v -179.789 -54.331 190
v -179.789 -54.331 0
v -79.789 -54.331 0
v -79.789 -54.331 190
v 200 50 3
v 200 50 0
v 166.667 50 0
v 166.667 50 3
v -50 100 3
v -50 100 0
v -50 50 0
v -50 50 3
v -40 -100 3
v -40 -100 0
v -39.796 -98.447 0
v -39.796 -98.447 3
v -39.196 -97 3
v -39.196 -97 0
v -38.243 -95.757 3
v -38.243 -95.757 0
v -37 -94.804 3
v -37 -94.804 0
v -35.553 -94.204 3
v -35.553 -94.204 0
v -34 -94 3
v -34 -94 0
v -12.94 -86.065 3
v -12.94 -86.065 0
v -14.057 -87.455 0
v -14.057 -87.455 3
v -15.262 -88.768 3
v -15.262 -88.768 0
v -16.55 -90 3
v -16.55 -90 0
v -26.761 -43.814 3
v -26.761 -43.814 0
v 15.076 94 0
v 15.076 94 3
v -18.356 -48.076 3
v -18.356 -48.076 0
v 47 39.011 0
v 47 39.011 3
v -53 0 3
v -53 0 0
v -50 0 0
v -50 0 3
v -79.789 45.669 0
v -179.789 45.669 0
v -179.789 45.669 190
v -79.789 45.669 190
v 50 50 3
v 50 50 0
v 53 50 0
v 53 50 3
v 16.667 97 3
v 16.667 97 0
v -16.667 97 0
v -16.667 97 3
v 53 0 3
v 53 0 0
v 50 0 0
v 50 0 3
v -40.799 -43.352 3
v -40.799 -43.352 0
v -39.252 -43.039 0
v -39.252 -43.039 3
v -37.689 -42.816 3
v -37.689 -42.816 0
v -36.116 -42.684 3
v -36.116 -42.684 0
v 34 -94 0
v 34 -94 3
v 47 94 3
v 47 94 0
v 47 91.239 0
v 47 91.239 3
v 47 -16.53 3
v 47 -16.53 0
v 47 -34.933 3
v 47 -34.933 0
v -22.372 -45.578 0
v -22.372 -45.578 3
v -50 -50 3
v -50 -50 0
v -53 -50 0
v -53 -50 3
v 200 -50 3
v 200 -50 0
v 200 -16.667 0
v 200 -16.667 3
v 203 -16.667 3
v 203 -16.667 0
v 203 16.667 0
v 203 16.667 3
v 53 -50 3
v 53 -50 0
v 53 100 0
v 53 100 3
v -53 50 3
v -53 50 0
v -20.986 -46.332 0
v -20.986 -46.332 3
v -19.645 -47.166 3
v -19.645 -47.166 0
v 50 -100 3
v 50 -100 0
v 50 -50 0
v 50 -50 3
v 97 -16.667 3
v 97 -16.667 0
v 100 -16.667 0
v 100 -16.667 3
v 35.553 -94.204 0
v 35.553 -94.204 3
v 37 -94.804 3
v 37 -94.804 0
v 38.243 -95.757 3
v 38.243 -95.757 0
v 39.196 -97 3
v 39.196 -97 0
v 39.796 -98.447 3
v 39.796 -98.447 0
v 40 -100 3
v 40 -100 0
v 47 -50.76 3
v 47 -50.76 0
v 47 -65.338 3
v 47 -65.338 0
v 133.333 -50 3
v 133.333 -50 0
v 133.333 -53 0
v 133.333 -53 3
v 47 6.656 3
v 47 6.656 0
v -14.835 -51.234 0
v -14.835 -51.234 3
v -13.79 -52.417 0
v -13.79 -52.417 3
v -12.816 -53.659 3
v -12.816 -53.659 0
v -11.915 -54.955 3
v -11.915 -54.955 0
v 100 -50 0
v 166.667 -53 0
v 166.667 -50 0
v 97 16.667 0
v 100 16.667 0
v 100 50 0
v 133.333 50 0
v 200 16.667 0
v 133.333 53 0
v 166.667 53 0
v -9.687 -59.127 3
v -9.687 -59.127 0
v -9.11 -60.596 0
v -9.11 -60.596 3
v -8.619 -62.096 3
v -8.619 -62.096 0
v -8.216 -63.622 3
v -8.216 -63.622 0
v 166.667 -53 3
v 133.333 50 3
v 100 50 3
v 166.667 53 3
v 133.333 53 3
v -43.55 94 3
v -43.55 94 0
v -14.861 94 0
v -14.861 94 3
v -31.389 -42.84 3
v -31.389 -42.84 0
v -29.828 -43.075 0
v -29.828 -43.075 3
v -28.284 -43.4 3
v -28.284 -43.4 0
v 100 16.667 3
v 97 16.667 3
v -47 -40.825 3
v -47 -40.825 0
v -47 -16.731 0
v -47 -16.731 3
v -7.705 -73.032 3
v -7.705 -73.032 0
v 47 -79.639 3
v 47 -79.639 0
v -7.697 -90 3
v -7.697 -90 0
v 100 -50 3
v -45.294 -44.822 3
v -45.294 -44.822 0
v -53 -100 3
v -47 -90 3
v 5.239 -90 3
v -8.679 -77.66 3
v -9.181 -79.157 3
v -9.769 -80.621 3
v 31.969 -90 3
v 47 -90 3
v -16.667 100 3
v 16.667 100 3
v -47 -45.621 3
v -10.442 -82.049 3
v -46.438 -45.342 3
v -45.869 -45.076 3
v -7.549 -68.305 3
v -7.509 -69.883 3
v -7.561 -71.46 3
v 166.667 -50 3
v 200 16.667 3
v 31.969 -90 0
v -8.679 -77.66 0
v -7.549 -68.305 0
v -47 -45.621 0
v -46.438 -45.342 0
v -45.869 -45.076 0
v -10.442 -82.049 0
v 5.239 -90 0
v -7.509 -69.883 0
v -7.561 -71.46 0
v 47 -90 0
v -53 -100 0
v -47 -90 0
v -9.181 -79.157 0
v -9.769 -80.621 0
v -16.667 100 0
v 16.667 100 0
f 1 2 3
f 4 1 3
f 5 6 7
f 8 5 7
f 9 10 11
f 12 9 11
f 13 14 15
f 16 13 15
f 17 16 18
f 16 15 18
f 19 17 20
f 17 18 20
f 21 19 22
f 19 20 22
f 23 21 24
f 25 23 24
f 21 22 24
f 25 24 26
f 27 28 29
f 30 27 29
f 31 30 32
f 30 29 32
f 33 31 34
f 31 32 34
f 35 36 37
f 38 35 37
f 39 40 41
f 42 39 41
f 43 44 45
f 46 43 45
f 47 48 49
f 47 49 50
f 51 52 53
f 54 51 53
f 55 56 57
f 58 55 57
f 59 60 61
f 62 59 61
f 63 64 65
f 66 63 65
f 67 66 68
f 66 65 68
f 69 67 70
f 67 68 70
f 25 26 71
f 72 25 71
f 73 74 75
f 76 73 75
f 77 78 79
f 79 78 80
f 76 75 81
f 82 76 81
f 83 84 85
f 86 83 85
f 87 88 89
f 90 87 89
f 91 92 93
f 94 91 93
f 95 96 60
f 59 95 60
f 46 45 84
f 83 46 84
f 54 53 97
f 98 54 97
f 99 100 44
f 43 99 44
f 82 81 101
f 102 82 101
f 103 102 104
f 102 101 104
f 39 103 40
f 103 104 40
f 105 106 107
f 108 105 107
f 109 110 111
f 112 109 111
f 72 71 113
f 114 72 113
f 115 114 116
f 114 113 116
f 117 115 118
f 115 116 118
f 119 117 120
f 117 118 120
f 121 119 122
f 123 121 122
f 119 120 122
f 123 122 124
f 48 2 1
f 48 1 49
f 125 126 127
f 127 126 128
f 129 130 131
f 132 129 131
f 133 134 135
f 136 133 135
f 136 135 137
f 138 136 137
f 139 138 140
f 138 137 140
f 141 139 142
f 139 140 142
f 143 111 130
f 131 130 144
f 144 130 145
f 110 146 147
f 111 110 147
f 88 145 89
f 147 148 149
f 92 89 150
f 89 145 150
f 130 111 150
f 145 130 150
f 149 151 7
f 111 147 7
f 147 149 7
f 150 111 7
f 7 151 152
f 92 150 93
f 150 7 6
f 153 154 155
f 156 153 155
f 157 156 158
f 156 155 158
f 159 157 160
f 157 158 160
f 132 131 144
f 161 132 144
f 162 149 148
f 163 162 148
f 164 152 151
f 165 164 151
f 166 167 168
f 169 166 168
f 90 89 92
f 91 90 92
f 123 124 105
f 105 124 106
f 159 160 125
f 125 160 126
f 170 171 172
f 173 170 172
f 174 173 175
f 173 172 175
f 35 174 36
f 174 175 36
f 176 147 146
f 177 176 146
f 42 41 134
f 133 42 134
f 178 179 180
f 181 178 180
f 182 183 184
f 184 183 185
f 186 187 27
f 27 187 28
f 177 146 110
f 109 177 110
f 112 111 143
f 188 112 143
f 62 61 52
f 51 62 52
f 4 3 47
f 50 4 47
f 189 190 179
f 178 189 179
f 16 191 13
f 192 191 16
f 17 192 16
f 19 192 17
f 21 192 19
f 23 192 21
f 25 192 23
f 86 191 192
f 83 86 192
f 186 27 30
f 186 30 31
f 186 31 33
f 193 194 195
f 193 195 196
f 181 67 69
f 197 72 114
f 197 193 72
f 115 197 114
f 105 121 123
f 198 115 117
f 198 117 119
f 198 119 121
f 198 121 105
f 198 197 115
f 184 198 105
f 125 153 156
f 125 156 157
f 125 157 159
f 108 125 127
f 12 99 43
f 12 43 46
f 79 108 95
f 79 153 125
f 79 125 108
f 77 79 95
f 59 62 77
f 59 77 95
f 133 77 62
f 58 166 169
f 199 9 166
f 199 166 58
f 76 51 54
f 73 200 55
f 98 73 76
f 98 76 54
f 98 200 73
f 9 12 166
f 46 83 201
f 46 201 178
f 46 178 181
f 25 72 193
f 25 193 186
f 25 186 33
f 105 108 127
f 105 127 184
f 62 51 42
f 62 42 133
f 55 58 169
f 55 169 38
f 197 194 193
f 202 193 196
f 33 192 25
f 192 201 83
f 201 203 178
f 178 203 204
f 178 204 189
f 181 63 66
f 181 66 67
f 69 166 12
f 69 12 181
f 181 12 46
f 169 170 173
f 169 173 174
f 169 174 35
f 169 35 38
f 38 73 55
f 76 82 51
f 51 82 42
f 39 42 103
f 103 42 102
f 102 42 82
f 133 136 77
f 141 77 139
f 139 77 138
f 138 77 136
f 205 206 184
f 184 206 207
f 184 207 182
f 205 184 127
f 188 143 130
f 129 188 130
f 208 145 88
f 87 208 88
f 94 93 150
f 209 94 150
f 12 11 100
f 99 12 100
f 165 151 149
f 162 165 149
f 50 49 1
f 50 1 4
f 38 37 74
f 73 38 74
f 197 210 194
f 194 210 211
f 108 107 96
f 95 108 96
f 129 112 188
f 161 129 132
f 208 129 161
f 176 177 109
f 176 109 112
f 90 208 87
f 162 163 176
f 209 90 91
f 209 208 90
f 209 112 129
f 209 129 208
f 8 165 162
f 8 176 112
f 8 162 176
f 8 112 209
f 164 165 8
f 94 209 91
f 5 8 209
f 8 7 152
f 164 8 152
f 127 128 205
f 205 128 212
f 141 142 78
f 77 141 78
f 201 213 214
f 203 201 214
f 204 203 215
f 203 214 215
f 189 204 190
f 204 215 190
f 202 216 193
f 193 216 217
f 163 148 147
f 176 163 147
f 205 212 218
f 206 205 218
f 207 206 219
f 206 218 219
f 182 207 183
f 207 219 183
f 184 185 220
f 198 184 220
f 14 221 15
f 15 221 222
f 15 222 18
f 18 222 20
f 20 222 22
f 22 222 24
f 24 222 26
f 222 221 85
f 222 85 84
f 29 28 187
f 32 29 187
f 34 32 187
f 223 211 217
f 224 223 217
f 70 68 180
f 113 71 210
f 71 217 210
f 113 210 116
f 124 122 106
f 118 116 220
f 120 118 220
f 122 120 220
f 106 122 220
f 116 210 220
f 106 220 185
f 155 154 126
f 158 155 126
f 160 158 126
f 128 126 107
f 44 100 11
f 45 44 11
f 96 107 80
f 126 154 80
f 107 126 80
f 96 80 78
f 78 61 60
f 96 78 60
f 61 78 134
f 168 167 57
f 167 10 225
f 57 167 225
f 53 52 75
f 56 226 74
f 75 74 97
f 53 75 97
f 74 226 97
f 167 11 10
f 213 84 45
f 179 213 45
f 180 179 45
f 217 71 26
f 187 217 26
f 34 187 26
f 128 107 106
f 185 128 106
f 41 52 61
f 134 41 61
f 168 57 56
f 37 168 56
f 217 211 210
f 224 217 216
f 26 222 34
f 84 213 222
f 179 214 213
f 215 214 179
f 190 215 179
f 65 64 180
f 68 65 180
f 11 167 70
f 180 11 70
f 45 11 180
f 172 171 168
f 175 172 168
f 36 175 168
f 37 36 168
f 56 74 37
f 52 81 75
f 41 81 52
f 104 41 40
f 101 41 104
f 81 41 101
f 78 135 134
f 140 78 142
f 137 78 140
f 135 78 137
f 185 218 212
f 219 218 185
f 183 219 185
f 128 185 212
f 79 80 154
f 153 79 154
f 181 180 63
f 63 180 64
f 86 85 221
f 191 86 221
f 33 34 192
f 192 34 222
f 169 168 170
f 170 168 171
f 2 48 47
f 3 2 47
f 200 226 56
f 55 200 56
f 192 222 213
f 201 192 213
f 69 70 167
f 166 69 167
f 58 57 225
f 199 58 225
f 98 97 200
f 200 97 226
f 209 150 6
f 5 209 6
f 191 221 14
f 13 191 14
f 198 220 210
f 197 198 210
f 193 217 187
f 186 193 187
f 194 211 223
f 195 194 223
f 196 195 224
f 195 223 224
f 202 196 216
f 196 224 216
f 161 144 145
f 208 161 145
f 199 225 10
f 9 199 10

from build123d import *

# Parameters (mm, degrees)
F1_DEPTH = 3
F2_W     = 100
F2_H     = 100
F3_DEPTH = 190


with BuildPart() as f1:
    # F0 (on Top) → F1 (new body)
    with BuildSketch(Plane.XY):
        with BuildLine():
            Line((-16.666667, 100), (-50, 100))
            Line((-50, 100), (-50, 50))
            Line((-50, 50), (-53, 50))
            Line((-53, 50), (-53, 0))
            Line((-53, 0), (-50, 0))
            Line((-50, 0), (-50, -50))
            Line((-50, -50), (-53, -50))
            Line((-53, -50), (-53, -100))
            Line((-53, -100), (-50, -100))
            Line((-50, -100), (-40, -100))
            ThreePointArc((-40, -100), (-38.242641, -95.757359), (-34, -94))
            Line((-34, -94), (34, -94))
            ThreePointArc((34, -94), (38.242641, -95.757359), (40, -100))
            Line((40, -100), (50, -100))
            Line((50, -100), (50, -50))
            Line((50, -50), (53, -50))
            Line((53, -50), (53, 0))
            Line((53, 0), (50, 0))
            Line((50, 0), (50, 50))
            Line((50, 50), (53, 50))
            Line((53, 50), (53, 100))
            Line((53, 100), (50, 100))
            Line((50, 100), (16.666667, 100))
            Line((16.666667, 100), (16.666667, 97))
            Line((16.666667, 97), (-16.666667, 97))
            Line((-16.666667, 97), (-16.666667, 100))
        make_face()
        Polygon((-47, -90), (-47, -45.621491), (-47, -40.825353), (-47, -16.73068), (-47, 94), (-43.549871, 94), (-14.861034, 94), (15.07639, 94), (47, 94), (47, 91.238711), (47, 39.010934), (47, 6.656318), (47, -16.529716), (47, -34.93287), (47, -50.759957), (47, -65.338158), (47, -79.639418), (47, -90), (31.968861, -90), (5.238734, -90), (-7.697305, -90), (-16.550338, -90), align=None, mode=Mode.SUBTRACT)
        Polygon((133.333333, 50), (100, 50), (100, 16.666667), (97, 16.666667), (97, -16.666667), (100, -16.666667), (100, -50), (133.333333, -50), (133.333333, -53), (166.666667, -53), (166.666667, -50), (200, -50), (200, -16.666667), (203, -16.666667), (203, 16.666667), (200, 16.666667), (200, 50), (166.666667, 50), (166.666667, 53), (133.333333, 53), align=None)
        with BuildLine():
            Line((-10.441975, -82.049185), (5.238734, -90))
            Line((5.238734, -90), (31.968861, -90))
            Line((31.968861, -90), (-8.678824, -77.660339))
            ThreePointArc((-8.678824, -77.660339), (-9.464589, -79.893253), (-10.441975, -82.049185))
        make_face()
        with BuildLine():
            Line((-7.704574, -73.032001), (47, -79.639418))
            Line((47, -79.639418), (47, -65.338158))
            Line((47, -65.338158), (-7.548828, -68.304802))
            ThreePointArc((-7.548828, -68.304802), (-7.523504, -70.671801), (-7.704574, -73.032001))
        make_face()
        with BuildLine():
            Line((-8.216318, -63.622374), (47, -50.759957))
            Line((47, -50.759957), (47, -34.93287))
            Line((47, -34.93287), (-9.686762, -59.126991))
            ThreePointArc((-9.686762, -59.126991), (-8.853404, -61.342582), (-8.216318, -63.622374))
        make_face()
        with BuildLine():
            Line((47, -16.529716), (47, 6.656318))
            Line((47, 6.656318), (-14.834759, -51.233886))
            ThreePointArc((-14.834759, -51.233886), (-13.293881, -53.030835), (-11.915482, -54.955243))
            Line((-11.915482, -54.955243), (47, -16.529716))
        make_face()
        with BuildLine():
            Line((47, 39.010934), (47, 91.238711))
            Line((47, 91.238711), (-22.371894, -45.577512))
            ThreePointArc((-22.371894, -45.577512), (-20.30935, -46.739081), (-18.355892, -48.075992))
            Line((-18.355892, -48.075992), (47, 39.010934))
        make_face()
        with BuildLine():
            Line((15.07639, 94), (-14.861034, 94))
            Line((-14.861034, 94), (-31.389078, -42.840112))
            ThreePointArc((-31.389078, -42.840112), (-29.053641, -43.226198), (-26.76074, -43.814361))
            Line((-26.76074, -43.814361), (15.07639, 94))
        make_face()
        with BuildLine():
            Line((-47, 94), (-47, -16.73068))
            Line((-47, -16.73068), (-40.798706, -43.351855))
            ThreePointArc((-40.798706, -43.351855), (-38.472063, -42.915891), (-36.116278, -42.684366))
            Line((-36.116278, -42.684366), (-43.549871, 94))
            Line((-43.549871, 94), (-47, 94))
        make_face()
        with BuildLine():
            Line((-47, -40.825353), (-47, -45.621491))
            ThreePointArc((-47, -45.621491), (-46.153982, -45.207086), (-45.294088, -44.822299))
            Line((-45.294088, -44.822299), (-47, -40.825353))
        make_face()
        with BuildLine():
            ThreePointArc((-12.940455, -86.065187), (-14.648367, -88.121611), (-16.550338, -90))
            Line((-16.550338, -90), (-7.697305, -90))
            Line((-7.697305, -90), (-12.940455, -86.065187))
        make_face()
    extrude(amount=F1_DEPTH)


with BuildPart() as f3:
    # F2 (on Top) → F3 (new body)
    with BuildSketch(Plane.XY):
        with Locations((-129.788876, -4.331257)):
            Rectangle(F2_W, F2_H)
    extrude(amount=F3_DEPTH)


solid = Compound([f1.part, f3.part])
